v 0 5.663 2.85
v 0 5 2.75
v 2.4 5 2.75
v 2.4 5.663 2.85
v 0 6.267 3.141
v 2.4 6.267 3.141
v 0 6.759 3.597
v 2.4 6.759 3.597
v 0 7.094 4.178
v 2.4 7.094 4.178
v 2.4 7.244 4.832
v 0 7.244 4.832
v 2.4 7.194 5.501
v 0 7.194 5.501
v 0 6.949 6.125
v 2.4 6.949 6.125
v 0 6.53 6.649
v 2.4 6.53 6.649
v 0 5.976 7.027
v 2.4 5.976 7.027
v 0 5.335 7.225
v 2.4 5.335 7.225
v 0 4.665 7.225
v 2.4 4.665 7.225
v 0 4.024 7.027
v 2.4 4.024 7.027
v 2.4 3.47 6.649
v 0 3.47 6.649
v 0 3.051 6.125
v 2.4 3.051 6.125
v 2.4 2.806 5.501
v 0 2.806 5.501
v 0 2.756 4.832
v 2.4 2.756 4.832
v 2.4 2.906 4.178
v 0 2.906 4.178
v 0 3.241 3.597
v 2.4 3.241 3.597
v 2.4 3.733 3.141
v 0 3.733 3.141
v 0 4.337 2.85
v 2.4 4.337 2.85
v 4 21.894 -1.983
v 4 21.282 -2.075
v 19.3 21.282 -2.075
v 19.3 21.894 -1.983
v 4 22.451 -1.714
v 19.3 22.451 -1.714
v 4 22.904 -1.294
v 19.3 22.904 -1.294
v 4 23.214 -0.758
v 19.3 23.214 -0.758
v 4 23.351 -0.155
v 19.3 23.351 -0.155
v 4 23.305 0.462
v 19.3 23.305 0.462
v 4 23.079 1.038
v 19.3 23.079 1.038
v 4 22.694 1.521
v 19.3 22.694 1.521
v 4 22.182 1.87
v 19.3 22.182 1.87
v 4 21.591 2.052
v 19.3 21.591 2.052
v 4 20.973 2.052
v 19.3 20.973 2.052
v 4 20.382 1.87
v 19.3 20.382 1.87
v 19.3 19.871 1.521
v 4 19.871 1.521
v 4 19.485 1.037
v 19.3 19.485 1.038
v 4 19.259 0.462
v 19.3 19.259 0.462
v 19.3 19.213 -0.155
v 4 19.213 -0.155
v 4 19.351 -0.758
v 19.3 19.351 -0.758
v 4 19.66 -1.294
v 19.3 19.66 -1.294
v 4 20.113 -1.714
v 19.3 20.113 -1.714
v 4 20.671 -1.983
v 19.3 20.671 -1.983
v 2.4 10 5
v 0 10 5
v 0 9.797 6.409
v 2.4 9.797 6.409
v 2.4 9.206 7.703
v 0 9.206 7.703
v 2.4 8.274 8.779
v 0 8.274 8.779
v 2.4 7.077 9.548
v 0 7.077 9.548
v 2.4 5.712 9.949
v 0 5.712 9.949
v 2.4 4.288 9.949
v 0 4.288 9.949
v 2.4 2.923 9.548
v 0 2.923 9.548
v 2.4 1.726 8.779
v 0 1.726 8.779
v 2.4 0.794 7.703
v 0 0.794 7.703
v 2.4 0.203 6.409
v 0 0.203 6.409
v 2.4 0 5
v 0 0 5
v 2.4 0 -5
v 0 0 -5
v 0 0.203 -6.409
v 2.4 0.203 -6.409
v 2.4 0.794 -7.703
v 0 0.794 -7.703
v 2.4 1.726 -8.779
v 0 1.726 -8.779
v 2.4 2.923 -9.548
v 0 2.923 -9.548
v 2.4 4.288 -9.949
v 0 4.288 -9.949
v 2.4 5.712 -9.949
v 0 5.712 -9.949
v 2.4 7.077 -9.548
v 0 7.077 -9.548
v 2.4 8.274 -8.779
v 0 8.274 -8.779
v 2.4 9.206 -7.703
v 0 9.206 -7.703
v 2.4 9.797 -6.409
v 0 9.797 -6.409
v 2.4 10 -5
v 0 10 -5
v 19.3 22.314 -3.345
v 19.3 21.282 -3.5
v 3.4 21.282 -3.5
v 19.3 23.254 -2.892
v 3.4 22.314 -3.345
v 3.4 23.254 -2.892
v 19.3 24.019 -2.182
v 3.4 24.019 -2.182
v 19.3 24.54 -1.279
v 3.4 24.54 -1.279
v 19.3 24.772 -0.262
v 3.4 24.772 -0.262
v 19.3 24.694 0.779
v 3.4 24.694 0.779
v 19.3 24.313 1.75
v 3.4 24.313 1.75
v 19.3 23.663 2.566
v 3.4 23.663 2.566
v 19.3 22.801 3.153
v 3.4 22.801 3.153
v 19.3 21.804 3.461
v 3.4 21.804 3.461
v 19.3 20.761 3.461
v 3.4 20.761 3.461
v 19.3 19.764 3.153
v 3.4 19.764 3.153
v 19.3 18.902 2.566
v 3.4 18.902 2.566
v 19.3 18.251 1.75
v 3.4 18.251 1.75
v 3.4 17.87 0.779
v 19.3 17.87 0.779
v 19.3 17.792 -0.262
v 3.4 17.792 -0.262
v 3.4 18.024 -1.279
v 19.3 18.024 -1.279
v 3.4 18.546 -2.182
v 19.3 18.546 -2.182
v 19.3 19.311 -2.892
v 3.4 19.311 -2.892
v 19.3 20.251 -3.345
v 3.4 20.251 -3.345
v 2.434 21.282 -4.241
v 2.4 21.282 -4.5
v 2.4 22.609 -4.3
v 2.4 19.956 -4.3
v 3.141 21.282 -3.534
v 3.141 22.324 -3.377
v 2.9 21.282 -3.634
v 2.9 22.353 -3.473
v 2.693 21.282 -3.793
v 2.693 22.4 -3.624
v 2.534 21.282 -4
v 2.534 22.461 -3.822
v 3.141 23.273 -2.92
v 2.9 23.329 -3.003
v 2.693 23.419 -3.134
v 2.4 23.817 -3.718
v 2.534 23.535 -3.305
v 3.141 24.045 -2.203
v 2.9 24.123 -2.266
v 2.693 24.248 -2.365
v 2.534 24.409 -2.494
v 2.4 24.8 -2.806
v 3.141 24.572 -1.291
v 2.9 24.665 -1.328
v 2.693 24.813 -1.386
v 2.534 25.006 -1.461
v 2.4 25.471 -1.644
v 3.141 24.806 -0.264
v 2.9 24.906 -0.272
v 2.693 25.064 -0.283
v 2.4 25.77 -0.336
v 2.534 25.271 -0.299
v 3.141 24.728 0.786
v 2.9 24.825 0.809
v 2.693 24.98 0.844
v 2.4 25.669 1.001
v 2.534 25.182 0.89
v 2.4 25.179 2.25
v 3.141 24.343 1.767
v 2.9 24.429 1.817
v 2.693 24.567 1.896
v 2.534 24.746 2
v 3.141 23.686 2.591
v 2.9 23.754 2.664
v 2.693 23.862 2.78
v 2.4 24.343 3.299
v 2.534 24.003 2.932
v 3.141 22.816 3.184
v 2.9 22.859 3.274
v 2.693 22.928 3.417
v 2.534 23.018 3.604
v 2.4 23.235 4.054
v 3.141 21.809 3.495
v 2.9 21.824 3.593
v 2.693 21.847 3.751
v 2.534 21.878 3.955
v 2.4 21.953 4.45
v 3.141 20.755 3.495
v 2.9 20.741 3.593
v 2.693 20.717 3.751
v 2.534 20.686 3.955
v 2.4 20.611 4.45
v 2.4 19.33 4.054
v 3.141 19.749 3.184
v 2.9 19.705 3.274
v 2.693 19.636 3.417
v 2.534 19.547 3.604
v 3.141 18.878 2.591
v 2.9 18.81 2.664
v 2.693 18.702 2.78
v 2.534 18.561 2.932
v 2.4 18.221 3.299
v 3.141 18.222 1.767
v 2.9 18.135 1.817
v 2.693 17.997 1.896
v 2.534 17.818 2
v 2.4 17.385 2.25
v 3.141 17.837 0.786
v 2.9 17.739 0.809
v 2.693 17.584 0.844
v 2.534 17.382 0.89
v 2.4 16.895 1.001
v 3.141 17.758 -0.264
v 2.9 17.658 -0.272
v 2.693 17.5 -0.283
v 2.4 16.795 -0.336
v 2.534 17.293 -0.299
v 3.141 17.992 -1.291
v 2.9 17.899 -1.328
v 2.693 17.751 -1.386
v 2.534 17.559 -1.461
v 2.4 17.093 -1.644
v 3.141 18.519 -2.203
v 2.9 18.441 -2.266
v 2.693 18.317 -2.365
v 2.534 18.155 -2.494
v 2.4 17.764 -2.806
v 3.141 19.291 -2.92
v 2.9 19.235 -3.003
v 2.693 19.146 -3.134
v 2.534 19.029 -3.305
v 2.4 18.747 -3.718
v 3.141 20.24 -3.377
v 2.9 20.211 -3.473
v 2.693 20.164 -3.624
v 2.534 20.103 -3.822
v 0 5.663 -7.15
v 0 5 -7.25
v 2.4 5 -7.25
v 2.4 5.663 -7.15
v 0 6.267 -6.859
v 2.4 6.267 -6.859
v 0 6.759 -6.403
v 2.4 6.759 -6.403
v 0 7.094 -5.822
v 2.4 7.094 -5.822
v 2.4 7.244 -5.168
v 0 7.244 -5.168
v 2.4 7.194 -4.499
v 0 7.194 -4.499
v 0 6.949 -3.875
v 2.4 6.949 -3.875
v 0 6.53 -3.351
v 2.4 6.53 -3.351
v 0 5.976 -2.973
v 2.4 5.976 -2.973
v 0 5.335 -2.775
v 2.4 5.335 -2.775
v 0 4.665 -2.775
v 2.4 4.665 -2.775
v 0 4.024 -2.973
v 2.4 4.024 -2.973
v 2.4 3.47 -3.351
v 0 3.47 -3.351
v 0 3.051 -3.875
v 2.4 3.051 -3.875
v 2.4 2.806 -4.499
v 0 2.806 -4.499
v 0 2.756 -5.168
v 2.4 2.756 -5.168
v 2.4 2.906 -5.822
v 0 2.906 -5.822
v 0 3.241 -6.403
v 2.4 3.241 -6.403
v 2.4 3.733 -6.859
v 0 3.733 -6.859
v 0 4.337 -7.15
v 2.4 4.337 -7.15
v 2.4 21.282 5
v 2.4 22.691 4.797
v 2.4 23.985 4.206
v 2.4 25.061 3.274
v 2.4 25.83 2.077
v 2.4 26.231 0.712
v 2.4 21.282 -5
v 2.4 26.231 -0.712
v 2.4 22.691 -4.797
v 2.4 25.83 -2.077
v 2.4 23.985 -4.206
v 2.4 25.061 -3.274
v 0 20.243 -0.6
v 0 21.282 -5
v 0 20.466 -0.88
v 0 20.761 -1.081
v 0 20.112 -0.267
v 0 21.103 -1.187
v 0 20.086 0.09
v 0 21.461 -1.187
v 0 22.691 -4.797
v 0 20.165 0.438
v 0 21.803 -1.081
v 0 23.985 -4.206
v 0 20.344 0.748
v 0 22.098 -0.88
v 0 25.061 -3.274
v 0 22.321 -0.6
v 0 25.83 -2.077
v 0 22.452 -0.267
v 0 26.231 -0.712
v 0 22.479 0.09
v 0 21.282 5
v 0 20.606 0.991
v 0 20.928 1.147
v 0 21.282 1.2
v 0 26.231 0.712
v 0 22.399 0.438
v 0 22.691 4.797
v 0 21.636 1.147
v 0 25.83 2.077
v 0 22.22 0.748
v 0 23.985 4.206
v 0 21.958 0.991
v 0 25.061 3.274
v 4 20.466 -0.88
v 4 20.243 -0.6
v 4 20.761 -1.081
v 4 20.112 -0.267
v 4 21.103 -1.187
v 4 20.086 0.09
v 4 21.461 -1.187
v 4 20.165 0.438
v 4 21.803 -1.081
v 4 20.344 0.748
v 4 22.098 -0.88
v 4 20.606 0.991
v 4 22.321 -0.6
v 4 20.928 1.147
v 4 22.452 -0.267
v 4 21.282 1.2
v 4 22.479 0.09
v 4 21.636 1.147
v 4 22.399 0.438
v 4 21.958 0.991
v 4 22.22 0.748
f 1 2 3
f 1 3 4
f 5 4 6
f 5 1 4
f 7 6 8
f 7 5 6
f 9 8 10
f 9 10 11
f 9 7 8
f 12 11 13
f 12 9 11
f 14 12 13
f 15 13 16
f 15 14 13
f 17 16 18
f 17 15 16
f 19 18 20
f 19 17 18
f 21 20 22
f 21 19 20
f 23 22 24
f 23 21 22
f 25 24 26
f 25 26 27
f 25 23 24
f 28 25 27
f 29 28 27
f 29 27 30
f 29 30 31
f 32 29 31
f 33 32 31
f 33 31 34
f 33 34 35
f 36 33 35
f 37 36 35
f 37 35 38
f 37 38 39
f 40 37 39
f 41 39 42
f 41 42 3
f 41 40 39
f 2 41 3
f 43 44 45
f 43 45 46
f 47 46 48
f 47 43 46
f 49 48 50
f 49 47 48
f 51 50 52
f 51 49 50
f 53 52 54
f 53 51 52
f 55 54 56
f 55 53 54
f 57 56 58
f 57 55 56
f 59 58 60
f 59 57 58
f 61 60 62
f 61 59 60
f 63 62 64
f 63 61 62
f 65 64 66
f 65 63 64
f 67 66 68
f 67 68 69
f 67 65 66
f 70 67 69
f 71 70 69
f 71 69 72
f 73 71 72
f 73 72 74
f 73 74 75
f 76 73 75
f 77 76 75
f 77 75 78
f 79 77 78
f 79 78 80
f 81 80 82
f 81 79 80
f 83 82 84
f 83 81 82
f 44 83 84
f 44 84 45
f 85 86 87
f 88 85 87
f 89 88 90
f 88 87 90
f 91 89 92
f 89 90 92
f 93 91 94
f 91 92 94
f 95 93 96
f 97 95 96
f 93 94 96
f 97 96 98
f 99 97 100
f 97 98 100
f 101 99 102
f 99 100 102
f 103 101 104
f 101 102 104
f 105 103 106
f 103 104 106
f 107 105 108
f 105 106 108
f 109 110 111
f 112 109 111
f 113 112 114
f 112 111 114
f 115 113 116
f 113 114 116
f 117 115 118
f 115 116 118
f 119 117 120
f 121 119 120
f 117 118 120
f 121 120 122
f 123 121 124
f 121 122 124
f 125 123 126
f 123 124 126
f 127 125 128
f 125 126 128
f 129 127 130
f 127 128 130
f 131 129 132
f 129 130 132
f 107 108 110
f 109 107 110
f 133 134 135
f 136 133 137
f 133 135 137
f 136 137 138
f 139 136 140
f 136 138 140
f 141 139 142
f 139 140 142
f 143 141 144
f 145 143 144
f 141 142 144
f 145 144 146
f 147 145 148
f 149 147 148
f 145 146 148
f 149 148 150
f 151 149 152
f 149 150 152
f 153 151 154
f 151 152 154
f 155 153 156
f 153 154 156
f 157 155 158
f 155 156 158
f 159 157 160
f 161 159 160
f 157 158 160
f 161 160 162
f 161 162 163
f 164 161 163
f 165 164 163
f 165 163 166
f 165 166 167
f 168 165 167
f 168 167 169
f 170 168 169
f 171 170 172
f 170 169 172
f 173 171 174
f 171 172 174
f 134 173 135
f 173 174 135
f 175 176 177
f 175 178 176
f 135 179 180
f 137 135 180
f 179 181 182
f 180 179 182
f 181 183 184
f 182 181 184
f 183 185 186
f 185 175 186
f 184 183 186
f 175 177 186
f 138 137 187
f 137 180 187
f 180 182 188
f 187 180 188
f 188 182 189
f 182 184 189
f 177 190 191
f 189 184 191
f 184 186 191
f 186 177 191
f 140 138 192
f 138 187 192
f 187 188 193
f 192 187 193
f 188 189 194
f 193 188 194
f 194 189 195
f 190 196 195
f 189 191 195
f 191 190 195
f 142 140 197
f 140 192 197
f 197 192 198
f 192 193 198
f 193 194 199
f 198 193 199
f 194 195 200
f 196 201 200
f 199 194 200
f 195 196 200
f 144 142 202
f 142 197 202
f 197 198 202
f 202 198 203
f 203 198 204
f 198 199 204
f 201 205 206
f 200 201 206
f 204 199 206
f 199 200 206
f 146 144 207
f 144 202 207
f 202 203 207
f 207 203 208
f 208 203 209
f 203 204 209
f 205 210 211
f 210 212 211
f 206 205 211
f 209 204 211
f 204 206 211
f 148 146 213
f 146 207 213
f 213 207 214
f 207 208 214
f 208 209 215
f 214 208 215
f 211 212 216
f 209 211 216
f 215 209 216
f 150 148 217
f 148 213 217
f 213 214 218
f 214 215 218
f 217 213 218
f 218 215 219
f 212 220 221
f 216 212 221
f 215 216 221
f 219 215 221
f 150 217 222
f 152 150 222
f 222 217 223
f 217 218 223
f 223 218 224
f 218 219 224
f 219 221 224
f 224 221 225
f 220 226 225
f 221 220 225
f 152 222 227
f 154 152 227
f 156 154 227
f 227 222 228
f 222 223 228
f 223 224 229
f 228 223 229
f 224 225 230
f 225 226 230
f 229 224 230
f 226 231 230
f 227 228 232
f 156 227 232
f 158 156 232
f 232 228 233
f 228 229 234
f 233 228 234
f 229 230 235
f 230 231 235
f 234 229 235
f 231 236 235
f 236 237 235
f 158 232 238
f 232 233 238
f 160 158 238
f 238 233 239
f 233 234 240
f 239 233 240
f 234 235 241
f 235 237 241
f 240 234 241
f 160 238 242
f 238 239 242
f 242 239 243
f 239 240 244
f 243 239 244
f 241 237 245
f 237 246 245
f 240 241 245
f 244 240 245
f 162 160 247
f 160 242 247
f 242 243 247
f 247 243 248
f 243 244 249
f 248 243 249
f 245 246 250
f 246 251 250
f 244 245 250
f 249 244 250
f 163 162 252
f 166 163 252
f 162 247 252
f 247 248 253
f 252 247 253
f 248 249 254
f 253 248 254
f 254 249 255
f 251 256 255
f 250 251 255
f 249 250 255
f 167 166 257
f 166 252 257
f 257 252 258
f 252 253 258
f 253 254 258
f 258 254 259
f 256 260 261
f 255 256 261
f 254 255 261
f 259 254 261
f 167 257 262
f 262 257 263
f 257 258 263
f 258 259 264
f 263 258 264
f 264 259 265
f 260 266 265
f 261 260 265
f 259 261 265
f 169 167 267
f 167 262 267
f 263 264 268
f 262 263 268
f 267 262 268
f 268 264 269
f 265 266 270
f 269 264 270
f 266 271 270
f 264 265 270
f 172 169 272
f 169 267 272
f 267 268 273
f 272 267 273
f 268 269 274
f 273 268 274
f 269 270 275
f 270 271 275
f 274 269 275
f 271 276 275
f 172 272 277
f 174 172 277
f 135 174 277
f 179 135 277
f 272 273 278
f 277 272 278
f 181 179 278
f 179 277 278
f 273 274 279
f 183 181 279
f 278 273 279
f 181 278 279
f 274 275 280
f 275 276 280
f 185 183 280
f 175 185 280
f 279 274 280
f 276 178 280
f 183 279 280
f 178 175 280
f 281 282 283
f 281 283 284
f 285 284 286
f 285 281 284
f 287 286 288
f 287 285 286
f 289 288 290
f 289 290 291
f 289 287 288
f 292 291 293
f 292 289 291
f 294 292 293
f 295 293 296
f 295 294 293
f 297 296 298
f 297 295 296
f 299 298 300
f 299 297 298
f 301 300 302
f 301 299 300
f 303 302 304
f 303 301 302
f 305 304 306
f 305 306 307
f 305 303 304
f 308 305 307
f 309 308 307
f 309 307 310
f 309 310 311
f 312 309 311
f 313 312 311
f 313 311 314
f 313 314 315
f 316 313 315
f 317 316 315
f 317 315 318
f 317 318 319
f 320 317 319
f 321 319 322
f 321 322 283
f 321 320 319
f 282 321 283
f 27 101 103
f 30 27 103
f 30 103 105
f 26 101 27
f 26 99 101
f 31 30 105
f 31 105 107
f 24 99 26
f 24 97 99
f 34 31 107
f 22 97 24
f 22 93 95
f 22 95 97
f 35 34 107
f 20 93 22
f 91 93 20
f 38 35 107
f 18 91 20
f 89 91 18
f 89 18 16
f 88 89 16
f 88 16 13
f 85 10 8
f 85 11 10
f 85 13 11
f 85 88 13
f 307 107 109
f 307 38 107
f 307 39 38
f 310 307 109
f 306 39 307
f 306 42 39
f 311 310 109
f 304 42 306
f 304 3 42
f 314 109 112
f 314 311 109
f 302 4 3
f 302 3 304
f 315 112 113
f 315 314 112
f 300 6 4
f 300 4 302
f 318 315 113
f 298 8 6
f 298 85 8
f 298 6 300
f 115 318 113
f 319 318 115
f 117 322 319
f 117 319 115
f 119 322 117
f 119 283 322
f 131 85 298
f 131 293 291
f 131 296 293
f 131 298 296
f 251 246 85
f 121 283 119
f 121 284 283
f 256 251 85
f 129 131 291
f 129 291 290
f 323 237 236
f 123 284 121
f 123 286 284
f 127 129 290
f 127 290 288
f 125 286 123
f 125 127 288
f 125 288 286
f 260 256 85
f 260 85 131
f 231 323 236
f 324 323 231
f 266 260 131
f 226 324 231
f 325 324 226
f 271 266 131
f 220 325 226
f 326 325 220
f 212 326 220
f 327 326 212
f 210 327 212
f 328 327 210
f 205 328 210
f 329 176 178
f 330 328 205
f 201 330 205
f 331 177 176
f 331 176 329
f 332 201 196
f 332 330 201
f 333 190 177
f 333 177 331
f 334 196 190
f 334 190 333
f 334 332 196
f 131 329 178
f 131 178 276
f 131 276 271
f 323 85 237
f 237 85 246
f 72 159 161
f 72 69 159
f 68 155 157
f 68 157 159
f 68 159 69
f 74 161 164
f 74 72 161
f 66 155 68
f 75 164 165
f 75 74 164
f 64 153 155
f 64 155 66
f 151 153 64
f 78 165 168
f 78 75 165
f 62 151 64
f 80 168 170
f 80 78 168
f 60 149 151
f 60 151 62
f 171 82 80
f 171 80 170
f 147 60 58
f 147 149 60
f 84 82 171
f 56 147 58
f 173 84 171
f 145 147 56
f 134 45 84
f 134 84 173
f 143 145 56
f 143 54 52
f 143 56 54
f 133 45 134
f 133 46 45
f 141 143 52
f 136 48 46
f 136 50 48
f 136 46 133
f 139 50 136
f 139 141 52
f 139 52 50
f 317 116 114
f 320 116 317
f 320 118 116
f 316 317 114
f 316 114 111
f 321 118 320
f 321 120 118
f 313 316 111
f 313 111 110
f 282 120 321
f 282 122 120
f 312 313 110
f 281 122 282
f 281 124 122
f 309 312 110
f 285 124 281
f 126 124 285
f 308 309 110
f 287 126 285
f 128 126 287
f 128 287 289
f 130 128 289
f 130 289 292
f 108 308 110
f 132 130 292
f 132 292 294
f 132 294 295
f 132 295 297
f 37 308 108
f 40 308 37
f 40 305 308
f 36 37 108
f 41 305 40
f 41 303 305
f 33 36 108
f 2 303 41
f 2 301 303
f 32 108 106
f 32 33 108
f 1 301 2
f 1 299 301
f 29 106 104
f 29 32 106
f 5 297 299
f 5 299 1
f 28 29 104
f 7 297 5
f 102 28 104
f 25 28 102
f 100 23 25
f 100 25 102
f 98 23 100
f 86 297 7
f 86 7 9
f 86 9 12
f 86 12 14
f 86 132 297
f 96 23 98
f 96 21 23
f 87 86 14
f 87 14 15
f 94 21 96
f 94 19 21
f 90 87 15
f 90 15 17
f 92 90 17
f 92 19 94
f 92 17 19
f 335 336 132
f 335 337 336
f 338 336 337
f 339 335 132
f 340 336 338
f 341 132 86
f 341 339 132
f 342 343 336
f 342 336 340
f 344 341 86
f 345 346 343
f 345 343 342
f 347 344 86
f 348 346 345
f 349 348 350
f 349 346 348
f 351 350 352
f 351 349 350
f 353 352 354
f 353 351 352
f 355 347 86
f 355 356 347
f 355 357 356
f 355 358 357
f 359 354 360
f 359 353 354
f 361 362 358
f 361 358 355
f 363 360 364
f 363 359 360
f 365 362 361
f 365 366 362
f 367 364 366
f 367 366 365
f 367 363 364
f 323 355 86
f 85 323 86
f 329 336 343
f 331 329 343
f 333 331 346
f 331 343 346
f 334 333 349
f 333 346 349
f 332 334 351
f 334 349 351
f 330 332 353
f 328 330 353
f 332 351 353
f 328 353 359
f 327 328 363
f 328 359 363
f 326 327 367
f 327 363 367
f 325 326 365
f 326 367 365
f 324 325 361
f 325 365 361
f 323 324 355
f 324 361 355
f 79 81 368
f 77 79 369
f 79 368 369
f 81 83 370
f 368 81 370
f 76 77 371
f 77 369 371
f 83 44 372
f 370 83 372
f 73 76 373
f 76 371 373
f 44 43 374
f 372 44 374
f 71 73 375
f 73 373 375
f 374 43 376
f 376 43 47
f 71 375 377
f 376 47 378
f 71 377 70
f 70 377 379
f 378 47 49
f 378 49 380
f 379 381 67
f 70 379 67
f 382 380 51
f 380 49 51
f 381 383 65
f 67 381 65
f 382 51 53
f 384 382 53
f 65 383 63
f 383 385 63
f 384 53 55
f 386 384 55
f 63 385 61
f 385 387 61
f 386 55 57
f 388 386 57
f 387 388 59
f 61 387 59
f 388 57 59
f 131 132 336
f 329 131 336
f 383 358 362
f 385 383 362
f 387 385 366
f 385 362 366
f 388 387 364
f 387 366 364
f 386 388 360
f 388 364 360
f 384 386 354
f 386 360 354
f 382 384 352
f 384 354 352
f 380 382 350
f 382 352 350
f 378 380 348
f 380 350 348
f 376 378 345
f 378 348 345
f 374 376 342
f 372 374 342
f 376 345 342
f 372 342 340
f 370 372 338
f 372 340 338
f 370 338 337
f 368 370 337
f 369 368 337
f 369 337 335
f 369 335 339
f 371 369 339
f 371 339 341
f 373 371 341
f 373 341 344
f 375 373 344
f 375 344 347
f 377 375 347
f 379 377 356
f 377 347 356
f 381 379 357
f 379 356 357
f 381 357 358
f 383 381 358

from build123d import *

# Parameters (mm, degrees)
SKETCH_1_R      = 2.25
SKETCH_1_R_2    = 2.075
EXTRUDE_1_DEPTH = 2.4
SKETCH_4_R      = 3.5
SKETCH_4_R_2    = 2.075
EXTRUDE_2_DEPTH = 16.9
FILLET_1_R      = 1
SKETCH_5_R      = 2.075
SKETCH_5_R_2    = 1.2
EXTRUDE_3_DEPTH = 4


with BuildPart() as part:
    # 草图1 → 凸台-拉伸1 (new body)
    with BuildSketch(Plane(origin=(0, 0, 0), x_dir=(0, 0, -1), z_dir=(1, 0, 0))):
        with BuildLine():
            Line((-5, 0), (5, 0))
            ThreePointArc((5, 0), (10, 5), (5, 10))
            Line((5, 10), (5, 21.282156306))
            ThreePointArc((5, 21.282156306), (0, 26.282156306), (-5, 21.282156306))
            Line((-5, 21.282156306), (-5, 10))
            ThreePointArc((-5, 10), (-10, 5), (-5, 0))
        make_face()
        with Locations((-5, 5)):
            Circle(SKETCH_1_R, mode=Mode.SUBTRACT)
        with Locations((5, 5)):
            Circle(SKETCH_1_R, mode=Mode.SUBTRACT)
        with Locations((0, 21.282156306)):
            Circle(SKETCH_1_R_2, mode=Mode.SUBTRACT)
    extrude(amount=EXTRUDE_1_DEPTH)

    # 草图4 → 凸台-拉伸2 (add)
    with BuildSketch(Plane(origin=(2.4, 0, 0), x_dir=(0, 0, -1), z_dir=(1, 0, 0))):
        with Locations((0, 21.282156306)):
            Circle(SKETCH_4_R)
        with Locations((0, 21.282156306)):
            Circle(SKETCH_4_R_2, mode=Mode.SUBTRACT)
    extrude(amount=EXTRUDE_2_DEPTH)

    # 圆角1
    fillet_1_edges = [part.edges().sort_by_distance(p)[0] for p in [
        (2.4, 21.282156306, 3.5),
    ]]
    fillet(fillet_1_edges, radius=FILLET_1_R)

    # 草图5 → 凸台-拉伸3 (add)
    with BuildSketch(Plane.ZY):
        with Locations((0, 21.282156306)):
            Circle(SKETCH_5_R)
        with Locations((0, 21.282156306)):
            Circle(SKETCH_5_R_2, mode=Mode.SUBTRACT)
    extrude(amount=-EXTRUDE_3_DEPTH)


solid = part.part
